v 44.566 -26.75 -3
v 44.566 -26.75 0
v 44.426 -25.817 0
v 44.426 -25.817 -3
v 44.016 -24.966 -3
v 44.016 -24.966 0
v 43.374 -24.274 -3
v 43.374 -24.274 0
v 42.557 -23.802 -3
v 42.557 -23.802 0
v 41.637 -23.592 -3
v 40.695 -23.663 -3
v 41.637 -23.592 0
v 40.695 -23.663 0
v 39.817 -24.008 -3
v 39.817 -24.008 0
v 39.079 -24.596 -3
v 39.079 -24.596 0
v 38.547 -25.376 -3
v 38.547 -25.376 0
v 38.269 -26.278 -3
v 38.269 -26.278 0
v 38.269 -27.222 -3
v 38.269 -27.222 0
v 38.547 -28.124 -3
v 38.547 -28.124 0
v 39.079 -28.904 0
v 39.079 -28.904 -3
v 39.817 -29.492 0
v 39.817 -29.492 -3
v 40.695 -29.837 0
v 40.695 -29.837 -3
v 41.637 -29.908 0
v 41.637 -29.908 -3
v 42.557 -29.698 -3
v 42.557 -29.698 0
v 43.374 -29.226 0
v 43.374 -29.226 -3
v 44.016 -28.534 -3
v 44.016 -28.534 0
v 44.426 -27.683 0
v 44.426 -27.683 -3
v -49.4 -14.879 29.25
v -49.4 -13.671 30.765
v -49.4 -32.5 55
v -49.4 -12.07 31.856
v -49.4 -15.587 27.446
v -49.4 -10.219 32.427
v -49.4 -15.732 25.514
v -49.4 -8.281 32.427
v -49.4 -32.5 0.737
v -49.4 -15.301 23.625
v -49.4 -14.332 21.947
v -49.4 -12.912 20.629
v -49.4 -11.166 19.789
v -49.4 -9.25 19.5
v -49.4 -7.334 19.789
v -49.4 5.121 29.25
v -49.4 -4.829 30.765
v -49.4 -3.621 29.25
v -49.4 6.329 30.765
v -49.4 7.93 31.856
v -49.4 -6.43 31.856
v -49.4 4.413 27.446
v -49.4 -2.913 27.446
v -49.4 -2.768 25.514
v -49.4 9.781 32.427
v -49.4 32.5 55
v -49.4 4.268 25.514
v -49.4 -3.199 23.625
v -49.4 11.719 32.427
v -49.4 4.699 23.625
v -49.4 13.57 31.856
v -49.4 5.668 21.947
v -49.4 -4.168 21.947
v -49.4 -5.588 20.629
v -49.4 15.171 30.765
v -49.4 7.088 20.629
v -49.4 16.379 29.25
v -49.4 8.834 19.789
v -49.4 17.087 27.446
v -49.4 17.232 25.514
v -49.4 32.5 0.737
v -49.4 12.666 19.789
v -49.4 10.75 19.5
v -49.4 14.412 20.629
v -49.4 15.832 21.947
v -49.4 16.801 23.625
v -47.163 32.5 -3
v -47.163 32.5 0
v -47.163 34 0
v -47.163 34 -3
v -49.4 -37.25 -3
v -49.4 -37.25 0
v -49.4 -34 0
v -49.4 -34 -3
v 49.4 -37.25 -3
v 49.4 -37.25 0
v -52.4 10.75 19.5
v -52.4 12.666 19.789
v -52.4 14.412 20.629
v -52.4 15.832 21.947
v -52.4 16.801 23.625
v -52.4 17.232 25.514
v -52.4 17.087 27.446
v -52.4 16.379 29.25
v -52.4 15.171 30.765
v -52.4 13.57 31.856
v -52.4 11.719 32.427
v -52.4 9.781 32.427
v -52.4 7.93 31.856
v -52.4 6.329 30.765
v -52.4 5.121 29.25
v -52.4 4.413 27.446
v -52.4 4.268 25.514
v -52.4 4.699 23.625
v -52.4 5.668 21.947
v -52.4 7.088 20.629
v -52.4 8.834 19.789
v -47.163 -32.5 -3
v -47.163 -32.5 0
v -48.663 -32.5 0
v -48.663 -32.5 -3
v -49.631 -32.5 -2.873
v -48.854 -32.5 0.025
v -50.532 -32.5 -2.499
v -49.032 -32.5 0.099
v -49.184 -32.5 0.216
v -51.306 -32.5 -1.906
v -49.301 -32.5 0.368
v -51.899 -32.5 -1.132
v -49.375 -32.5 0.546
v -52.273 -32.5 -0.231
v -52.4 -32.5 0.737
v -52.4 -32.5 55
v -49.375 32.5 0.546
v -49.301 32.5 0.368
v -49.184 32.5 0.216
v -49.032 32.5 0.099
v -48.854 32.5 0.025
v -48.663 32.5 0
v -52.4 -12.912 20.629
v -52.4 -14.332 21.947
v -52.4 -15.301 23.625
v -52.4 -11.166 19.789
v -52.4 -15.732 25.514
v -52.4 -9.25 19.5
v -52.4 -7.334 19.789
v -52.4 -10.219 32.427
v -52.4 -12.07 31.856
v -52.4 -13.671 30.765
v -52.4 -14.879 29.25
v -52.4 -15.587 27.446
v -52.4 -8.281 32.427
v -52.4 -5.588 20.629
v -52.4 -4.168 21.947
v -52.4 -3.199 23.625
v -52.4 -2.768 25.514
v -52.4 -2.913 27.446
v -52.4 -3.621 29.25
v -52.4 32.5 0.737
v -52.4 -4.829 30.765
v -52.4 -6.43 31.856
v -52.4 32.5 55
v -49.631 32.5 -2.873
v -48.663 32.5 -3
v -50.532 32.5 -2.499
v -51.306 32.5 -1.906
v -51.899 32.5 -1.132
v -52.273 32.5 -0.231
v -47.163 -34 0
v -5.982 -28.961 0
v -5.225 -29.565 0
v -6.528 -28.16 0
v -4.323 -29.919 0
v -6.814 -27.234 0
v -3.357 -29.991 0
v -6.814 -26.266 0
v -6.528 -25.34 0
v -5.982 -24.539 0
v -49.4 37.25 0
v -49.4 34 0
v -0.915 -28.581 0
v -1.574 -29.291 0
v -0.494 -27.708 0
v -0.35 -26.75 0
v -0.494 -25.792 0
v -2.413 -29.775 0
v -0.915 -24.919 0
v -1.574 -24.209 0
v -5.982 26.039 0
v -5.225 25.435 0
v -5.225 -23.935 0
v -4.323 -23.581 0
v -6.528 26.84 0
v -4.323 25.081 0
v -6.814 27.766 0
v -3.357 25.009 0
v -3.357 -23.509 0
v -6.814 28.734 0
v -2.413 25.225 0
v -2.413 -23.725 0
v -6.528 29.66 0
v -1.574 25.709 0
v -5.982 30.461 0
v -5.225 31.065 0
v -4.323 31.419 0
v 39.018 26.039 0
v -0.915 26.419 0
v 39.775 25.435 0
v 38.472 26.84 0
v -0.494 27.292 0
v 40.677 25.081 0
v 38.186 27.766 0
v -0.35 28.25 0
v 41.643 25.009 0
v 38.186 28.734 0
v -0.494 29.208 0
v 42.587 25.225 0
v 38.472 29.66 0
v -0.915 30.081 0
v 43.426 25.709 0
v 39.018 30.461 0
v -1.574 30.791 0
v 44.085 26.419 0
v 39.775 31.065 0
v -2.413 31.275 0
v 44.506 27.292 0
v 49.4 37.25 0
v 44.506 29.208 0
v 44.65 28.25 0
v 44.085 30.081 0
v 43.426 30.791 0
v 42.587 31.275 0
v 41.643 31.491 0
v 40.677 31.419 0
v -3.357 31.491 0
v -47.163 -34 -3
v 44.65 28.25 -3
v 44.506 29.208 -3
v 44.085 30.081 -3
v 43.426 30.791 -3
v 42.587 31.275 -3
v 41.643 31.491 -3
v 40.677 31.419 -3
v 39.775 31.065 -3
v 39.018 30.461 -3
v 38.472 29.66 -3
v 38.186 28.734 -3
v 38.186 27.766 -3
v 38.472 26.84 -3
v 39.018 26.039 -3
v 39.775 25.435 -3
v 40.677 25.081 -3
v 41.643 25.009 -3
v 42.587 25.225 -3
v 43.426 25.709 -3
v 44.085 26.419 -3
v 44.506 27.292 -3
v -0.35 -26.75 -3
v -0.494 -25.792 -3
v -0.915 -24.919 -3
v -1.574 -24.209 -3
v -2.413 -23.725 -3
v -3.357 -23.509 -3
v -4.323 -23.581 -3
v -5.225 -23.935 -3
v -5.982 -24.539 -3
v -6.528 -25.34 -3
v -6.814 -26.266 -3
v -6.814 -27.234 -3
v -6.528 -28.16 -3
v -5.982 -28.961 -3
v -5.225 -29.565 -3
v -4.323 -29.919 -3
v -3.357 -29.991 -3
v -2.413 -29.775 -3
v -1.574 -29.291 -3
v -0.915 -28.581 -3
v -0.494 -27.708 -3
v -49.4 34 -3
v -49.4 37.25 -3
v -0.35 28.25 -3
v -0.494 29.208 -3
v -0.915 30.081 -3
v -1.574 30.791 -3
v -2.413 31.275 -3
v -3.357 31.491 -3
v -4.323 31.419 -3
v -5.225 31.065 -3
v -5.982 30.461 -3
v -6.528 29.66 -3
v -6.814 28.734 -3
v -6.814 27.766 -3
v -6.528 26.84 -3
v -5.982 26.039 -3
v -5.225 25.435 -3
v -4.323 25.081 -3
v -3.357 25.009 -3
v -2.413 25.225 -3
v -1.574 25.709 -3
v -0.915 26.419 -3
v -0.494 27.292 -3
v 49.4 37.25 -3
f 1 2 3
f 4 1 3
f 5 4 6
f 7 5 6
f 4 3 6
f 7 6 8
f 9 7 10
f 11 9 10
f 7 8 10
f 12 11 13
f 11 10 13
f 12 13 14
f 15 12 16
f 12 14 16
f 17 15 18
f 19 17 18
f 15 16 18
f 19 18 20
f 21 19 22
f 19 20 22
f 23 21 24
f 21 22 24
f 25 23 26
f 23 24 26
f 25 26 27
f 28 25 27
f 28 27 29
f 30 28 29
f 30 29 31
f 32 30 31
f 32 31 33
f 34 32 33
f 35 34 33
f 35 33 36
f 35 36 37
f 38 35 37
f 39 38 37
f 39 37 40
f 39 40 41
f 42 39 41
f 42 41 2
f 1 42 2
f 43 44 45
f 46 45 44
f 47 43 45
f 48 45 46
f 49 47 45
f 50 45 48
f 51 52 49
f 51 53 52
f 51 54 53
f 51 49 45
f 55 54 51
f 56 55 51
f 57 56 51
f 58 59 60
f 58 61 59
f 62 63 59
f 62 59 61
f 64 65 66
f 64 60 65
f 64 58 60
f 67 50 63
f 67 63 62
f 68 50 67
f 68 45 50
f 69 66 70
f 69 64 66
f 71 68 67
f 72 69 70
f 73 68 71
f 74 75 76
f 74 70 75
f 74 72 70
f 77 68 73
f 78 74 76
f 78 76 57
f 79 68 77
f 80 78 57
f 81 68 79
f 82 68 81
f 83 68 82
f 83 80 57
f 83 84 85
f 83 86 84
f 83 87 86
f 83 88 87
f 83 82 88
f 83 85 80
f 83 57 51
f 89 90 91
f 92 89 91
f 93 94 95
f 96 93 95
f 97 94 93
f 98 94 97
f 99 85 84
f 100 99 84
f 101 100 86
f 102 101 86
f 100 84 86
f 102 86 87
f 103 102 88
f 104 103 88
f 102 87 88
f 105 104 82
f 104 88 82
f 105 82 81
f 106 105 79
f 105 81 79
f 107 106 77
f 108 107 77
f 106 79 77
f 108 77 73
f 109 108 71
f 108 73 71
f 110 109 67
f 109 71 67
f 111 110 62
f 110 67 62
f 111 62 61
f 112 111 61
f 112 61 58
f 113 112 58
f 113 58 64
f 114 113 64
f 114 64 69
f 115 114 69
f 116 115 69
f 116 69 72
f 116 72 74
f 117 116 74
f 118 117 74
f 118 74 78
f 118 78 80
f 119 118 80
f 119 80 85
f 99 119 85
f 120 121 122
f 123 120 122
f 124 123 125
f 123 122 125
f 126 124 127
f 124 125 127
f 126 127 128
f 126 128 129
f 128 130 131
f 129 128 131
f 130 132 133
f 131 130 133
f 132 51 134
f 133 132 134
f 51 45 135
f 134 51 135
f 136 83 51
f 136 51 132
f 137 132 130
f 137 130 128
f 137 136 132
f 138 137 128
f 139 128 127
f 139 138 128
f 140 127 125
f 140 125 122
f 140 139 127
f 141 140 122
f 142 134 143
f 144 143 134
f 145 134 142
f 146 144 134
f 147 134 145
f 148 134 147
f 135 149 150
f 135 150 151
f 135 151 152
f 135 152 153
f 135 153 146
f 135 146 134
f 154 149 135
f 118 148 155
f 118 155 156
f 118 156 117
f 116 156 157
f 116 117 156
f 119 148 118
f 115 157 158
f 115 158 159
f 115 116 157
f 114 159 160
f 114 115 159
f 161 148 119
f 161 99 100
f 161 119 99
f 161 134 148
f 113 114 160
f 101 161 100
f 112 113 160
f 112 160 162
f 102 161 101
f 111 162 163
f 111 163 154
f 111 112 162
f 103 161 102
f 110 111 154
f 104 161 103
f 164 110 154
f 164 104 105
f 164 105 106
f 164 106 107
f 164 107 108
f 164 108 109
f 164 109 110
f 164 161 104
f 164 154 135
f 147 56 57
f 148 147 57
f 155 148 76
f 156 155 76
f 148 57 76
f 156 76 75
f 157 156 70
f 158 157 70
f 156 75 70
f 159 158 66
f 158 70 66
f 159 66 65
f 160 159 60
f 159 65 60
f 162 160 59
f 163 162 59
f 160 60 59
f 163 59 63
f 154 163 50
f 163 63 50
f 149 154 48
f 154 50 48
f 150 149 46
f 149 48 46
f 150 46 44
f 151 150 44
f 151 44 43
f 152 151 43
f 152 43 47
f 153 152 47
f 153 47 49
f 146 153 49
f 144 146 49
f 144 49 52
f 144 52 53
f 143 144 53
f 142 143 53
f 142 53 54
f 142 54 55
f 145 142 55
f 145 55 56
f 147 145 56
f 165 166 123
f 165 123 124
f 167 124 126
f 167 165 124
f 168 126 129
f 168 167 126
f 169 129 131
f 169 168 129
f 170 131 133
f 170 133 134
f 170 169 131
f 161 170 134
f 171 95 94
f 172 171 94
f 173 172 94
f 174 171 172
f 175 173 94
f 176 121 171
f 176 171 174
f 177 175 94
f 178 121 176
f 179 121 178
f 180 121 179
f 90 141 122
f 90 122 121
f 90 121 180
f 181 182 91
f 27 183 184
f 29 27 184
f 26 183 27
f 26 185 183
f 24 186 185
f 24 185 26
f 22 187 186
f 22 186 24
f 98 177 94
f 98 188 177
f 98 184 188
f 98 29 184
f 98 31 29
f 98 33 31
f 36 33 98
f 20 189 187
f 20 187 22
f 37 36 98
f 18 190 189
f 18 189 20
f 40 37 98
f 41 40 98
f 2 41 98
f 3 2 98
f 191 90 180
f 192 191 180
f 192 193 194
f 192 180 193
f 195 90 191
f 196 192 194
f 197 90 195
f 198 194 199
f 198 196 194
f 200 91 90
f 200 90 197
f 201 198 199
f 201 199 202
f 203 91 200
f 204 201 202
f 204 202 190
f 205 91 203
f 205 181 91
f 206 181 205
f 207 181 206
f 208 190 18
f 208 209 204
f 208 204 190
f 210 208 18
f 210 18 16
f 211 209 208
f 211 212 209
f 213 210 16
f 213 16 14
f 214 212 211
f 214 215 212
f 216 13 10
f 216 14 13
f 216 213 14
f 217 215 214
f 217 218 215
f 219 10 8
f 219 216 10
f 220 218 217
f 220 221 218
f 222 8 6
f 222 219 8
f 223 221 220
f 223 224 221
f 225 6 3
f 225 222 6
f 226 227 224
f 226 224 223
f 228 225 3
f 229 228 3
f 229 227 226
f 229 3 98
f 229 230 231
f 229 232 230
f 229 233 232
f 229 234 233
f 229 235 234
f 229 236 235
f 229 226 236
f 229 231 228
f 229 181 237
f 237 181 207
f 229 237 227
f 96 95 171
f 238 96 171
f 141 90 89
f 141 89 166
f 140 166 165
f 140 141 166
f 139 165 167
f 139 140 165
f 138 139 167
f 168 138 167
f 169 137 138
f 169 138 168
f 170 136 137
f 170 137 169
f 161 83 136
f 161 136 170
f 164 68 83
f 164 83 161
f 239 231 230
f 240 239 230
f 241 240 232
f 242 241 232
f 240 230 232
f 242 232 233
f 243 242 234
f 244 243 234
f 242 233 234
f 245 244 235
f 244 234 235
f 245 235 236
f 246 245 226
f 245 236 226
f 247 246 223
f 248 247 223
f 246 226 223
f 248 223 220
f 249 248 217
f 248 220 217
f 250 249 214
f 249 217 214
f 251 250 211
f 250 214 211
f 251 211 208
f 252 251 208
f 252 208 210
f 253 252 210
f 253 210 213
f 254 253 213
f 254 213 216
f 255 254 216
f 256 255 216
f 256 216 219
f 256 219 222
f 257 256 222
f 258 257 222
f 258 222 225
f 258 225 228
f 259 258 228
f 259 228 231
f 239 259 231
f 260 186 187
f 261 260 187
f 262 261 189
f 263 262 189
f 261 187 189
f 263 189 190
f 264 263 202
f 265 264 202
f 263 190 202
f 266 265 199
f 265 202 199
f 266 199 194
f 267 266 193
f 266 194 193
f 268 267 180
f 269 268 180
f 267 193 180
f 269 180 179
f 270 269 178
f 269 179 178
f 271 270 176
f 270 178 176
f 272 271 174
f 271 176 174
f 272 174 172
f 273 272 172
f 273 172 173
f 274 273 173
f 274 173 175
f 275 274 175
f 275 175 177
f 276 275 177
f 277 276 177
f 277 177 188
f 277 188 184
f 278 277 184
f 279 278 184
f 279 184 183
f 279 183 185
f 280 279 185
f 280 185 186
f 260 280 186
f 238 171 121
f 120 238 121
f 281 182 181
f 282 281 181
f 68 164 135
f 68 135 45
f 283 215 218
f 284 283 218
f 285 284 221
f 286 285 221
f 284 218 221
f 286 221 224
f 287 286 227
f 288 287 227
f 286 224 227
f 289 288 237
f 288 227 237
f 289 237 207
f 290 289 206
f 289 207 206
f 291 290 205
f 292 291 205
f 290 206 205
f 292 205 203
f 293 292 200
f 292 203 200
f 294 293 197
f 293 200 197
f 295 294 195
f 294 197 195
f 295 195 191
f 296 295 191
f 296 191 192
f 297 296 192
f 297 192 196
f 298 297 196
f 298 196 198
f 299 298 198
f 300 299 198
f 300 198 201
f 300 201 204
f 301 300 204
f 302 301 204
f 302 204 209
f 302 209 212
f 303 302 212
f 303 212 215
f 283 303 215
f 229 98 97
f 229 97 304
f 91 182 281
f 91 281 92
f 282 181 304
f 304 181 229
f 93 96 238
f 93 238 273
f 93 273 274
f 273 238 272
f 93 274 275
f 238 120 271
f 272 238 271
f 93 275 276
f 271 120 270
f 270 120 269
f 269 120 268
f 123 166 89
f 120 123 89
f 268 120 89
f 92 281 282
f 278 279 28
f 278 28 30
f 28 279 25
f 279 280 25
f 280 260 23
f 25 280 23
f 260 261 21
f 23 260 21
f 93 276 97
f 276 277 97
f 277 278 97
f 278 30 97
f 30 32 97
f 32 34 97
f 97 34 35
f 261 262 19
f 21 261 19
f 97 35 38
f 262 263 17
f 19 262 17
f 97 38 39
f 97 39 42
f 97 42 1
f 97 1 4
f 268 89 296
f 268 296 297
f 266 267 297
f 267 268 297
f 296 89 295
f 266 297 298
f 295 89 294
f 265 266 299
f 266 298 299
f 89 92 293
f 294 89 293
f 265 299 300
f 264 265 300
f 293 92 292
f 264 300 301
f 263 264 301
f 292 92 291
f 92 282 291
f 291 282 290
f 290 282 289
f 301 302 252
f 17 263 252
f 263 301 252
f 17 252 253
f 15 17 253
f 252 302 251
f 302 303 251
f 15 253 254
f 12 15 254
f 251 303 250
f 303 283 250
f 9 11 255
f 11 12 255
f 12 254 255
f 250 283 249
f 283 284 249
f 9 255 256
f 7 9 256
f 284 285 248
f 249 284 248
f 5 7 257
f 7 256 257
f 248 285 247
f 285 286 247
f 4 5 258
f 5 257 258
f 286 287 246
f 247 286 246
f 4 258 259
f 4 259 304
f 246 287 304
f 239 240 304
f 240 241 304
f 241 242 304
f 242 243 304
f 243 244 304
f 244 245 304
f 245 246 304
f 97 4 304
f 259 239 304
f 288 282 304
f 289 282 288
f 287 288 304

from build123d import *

# Parameters (mm, degrees)
IZIM1_W                       = 98.8
IZIM1_H                       = 74.5
TABAN_FLAN_1_DEPTH            = 3
KENAR_FLAN_1_STRIP_W          = 13.4732
KENAR_FLAN_1_STRIP_H          = 3
KENAR_FLAN_1_STRIP_CUT_DEPTH  = 65
KENAR_FLAN_1_RELIEF_W         = 14.9732
KENAR_FLAN_1_RELIEF_H         = 1.5
KENAR_FLAN_1_RELIEF_CUT_DEPTH = 3
KENAR_FLAN_1_DEPTH            = 65
IZIM9_R                       = 6.5
KES_EKSTR_ZYON1_DEPTH         = 10
IZIM11_R                      = 3.25
IZIM11_R_2                    = 3.166439954
KES_EKSTR_ZYON2_DEPTH         = 10


# Sheet-metal steps are written as plain solids
with BuildPart() as part:
    # Çizim1 → Taban-Flanş1 (new body)
    with BuildSketch(Plane.XY):
        Rectangle(IZIM1_W, IZIM1_H)
    extrude(amount=-TABAN_FLAN_1_DEPTH)

    # Kenar-Flanş1 strip (across the edge) → Kenar-Flanş1 strip cut (cut)
    with BuildSketch(Plane(origin=(-49.4, 32.5, 0), x_dir=(1, 0, 0), z_dir=(0, -1, 0))):
        with Locations((-6, -1.5)):
            Rectangle(KENAR_FLAN_1_STRIP_W, KENAR_FLAN_1_STRIP_H)
    extrude(amount=KENAR_FLAN_1_STRIP_CUT_DEPTH, mode=Mode.SUBTRACT)

    # Kenar-Flanş1 relief (on the sheet) → Kenar-Flanş1 relief cut (cut)
    with BuildSketch(Plane(origin=(-48.6634, 32.5, 0), x_dir=(1, 0, 0), z_dir=(0, 0, 1))):
        with Locations((-5.9866, 0.75)):
            Rectangle(KENAR_FLAN_1_RELIEF_W, KENAR_FLAN_1_RELIEF_H)
        with Locations((-5.9866, -65.75)):
            Rectangle(KENAR_FLAN_1_RELIEF_W, KENAR_FLAN_1_RELIEF_H)
    extrude(amount=-KENAR_FLAN_1_RELIEF_CUT_DEPTH, mode=Mode.SUBTRACT)

    # Kenar-Flanş1 section (across the edge) → Kenar-Flanş1 (add)
    with BuildSketch(Plane(origin=(-49.4, 32.5, 0), x_dir=(1, 0, 0), z_dir=(0, -1, 0))):
        with BuildLine():
            Line((-3, 0.7366), (-3, 55))
            Line((-3, 55), (0, 55))
            Line((0, 55), (0, 0.7366))
            ThreePointArc((0, 0.7366), (0.215745145, 0.215745145), (0.7366, 0))
            Line((0.7366, 0), (0.7366, -3))
            ThreePointArc((0.7366, -3), (-1.905575199, -1.905575199), (-3, 0.7366))
        make_face()
    extrude(amount=KENAR_FLAN_1_DEPTH)

    # Çizim9 → Kes-Ekstrüzyon1 (cut)
    with BuildSketch(Plane(origin=(-49.4, 0, 0), x_dir=(0, 0, -1), z_dir=(1, 0, 0))):
        with Locations((-26, 10.75)):
            Circle(IZIM9_R)
        with Locations((-26, -9.25)):
            Circle(IZIM9_R)
    extrude(amount=-KES_EKSTR_ZYON1_DEPTH, mode=Mode.SUBTRACT)

    # Çizim11 → Kes-Ekstrüzyon2 (cut)
    with BuildSketch(Plane.XY):
        with Locations((41.4, 28.25)):
            Circle(IZIM11_R)
        with Locations((-3.6, 28.25)):
            Circle(IZIM11_R)
        with Locations((-3.6, -26.75)):
            Circle(IZIM11_R)
        with Locations((41.4, -26.75)):
            Circle(IZIM11_R_2)
    extrude(amount=-KES_EKSTR_ZYON2_DEPTH, mode=Mode.SUBTRACT)


solid = part.part
